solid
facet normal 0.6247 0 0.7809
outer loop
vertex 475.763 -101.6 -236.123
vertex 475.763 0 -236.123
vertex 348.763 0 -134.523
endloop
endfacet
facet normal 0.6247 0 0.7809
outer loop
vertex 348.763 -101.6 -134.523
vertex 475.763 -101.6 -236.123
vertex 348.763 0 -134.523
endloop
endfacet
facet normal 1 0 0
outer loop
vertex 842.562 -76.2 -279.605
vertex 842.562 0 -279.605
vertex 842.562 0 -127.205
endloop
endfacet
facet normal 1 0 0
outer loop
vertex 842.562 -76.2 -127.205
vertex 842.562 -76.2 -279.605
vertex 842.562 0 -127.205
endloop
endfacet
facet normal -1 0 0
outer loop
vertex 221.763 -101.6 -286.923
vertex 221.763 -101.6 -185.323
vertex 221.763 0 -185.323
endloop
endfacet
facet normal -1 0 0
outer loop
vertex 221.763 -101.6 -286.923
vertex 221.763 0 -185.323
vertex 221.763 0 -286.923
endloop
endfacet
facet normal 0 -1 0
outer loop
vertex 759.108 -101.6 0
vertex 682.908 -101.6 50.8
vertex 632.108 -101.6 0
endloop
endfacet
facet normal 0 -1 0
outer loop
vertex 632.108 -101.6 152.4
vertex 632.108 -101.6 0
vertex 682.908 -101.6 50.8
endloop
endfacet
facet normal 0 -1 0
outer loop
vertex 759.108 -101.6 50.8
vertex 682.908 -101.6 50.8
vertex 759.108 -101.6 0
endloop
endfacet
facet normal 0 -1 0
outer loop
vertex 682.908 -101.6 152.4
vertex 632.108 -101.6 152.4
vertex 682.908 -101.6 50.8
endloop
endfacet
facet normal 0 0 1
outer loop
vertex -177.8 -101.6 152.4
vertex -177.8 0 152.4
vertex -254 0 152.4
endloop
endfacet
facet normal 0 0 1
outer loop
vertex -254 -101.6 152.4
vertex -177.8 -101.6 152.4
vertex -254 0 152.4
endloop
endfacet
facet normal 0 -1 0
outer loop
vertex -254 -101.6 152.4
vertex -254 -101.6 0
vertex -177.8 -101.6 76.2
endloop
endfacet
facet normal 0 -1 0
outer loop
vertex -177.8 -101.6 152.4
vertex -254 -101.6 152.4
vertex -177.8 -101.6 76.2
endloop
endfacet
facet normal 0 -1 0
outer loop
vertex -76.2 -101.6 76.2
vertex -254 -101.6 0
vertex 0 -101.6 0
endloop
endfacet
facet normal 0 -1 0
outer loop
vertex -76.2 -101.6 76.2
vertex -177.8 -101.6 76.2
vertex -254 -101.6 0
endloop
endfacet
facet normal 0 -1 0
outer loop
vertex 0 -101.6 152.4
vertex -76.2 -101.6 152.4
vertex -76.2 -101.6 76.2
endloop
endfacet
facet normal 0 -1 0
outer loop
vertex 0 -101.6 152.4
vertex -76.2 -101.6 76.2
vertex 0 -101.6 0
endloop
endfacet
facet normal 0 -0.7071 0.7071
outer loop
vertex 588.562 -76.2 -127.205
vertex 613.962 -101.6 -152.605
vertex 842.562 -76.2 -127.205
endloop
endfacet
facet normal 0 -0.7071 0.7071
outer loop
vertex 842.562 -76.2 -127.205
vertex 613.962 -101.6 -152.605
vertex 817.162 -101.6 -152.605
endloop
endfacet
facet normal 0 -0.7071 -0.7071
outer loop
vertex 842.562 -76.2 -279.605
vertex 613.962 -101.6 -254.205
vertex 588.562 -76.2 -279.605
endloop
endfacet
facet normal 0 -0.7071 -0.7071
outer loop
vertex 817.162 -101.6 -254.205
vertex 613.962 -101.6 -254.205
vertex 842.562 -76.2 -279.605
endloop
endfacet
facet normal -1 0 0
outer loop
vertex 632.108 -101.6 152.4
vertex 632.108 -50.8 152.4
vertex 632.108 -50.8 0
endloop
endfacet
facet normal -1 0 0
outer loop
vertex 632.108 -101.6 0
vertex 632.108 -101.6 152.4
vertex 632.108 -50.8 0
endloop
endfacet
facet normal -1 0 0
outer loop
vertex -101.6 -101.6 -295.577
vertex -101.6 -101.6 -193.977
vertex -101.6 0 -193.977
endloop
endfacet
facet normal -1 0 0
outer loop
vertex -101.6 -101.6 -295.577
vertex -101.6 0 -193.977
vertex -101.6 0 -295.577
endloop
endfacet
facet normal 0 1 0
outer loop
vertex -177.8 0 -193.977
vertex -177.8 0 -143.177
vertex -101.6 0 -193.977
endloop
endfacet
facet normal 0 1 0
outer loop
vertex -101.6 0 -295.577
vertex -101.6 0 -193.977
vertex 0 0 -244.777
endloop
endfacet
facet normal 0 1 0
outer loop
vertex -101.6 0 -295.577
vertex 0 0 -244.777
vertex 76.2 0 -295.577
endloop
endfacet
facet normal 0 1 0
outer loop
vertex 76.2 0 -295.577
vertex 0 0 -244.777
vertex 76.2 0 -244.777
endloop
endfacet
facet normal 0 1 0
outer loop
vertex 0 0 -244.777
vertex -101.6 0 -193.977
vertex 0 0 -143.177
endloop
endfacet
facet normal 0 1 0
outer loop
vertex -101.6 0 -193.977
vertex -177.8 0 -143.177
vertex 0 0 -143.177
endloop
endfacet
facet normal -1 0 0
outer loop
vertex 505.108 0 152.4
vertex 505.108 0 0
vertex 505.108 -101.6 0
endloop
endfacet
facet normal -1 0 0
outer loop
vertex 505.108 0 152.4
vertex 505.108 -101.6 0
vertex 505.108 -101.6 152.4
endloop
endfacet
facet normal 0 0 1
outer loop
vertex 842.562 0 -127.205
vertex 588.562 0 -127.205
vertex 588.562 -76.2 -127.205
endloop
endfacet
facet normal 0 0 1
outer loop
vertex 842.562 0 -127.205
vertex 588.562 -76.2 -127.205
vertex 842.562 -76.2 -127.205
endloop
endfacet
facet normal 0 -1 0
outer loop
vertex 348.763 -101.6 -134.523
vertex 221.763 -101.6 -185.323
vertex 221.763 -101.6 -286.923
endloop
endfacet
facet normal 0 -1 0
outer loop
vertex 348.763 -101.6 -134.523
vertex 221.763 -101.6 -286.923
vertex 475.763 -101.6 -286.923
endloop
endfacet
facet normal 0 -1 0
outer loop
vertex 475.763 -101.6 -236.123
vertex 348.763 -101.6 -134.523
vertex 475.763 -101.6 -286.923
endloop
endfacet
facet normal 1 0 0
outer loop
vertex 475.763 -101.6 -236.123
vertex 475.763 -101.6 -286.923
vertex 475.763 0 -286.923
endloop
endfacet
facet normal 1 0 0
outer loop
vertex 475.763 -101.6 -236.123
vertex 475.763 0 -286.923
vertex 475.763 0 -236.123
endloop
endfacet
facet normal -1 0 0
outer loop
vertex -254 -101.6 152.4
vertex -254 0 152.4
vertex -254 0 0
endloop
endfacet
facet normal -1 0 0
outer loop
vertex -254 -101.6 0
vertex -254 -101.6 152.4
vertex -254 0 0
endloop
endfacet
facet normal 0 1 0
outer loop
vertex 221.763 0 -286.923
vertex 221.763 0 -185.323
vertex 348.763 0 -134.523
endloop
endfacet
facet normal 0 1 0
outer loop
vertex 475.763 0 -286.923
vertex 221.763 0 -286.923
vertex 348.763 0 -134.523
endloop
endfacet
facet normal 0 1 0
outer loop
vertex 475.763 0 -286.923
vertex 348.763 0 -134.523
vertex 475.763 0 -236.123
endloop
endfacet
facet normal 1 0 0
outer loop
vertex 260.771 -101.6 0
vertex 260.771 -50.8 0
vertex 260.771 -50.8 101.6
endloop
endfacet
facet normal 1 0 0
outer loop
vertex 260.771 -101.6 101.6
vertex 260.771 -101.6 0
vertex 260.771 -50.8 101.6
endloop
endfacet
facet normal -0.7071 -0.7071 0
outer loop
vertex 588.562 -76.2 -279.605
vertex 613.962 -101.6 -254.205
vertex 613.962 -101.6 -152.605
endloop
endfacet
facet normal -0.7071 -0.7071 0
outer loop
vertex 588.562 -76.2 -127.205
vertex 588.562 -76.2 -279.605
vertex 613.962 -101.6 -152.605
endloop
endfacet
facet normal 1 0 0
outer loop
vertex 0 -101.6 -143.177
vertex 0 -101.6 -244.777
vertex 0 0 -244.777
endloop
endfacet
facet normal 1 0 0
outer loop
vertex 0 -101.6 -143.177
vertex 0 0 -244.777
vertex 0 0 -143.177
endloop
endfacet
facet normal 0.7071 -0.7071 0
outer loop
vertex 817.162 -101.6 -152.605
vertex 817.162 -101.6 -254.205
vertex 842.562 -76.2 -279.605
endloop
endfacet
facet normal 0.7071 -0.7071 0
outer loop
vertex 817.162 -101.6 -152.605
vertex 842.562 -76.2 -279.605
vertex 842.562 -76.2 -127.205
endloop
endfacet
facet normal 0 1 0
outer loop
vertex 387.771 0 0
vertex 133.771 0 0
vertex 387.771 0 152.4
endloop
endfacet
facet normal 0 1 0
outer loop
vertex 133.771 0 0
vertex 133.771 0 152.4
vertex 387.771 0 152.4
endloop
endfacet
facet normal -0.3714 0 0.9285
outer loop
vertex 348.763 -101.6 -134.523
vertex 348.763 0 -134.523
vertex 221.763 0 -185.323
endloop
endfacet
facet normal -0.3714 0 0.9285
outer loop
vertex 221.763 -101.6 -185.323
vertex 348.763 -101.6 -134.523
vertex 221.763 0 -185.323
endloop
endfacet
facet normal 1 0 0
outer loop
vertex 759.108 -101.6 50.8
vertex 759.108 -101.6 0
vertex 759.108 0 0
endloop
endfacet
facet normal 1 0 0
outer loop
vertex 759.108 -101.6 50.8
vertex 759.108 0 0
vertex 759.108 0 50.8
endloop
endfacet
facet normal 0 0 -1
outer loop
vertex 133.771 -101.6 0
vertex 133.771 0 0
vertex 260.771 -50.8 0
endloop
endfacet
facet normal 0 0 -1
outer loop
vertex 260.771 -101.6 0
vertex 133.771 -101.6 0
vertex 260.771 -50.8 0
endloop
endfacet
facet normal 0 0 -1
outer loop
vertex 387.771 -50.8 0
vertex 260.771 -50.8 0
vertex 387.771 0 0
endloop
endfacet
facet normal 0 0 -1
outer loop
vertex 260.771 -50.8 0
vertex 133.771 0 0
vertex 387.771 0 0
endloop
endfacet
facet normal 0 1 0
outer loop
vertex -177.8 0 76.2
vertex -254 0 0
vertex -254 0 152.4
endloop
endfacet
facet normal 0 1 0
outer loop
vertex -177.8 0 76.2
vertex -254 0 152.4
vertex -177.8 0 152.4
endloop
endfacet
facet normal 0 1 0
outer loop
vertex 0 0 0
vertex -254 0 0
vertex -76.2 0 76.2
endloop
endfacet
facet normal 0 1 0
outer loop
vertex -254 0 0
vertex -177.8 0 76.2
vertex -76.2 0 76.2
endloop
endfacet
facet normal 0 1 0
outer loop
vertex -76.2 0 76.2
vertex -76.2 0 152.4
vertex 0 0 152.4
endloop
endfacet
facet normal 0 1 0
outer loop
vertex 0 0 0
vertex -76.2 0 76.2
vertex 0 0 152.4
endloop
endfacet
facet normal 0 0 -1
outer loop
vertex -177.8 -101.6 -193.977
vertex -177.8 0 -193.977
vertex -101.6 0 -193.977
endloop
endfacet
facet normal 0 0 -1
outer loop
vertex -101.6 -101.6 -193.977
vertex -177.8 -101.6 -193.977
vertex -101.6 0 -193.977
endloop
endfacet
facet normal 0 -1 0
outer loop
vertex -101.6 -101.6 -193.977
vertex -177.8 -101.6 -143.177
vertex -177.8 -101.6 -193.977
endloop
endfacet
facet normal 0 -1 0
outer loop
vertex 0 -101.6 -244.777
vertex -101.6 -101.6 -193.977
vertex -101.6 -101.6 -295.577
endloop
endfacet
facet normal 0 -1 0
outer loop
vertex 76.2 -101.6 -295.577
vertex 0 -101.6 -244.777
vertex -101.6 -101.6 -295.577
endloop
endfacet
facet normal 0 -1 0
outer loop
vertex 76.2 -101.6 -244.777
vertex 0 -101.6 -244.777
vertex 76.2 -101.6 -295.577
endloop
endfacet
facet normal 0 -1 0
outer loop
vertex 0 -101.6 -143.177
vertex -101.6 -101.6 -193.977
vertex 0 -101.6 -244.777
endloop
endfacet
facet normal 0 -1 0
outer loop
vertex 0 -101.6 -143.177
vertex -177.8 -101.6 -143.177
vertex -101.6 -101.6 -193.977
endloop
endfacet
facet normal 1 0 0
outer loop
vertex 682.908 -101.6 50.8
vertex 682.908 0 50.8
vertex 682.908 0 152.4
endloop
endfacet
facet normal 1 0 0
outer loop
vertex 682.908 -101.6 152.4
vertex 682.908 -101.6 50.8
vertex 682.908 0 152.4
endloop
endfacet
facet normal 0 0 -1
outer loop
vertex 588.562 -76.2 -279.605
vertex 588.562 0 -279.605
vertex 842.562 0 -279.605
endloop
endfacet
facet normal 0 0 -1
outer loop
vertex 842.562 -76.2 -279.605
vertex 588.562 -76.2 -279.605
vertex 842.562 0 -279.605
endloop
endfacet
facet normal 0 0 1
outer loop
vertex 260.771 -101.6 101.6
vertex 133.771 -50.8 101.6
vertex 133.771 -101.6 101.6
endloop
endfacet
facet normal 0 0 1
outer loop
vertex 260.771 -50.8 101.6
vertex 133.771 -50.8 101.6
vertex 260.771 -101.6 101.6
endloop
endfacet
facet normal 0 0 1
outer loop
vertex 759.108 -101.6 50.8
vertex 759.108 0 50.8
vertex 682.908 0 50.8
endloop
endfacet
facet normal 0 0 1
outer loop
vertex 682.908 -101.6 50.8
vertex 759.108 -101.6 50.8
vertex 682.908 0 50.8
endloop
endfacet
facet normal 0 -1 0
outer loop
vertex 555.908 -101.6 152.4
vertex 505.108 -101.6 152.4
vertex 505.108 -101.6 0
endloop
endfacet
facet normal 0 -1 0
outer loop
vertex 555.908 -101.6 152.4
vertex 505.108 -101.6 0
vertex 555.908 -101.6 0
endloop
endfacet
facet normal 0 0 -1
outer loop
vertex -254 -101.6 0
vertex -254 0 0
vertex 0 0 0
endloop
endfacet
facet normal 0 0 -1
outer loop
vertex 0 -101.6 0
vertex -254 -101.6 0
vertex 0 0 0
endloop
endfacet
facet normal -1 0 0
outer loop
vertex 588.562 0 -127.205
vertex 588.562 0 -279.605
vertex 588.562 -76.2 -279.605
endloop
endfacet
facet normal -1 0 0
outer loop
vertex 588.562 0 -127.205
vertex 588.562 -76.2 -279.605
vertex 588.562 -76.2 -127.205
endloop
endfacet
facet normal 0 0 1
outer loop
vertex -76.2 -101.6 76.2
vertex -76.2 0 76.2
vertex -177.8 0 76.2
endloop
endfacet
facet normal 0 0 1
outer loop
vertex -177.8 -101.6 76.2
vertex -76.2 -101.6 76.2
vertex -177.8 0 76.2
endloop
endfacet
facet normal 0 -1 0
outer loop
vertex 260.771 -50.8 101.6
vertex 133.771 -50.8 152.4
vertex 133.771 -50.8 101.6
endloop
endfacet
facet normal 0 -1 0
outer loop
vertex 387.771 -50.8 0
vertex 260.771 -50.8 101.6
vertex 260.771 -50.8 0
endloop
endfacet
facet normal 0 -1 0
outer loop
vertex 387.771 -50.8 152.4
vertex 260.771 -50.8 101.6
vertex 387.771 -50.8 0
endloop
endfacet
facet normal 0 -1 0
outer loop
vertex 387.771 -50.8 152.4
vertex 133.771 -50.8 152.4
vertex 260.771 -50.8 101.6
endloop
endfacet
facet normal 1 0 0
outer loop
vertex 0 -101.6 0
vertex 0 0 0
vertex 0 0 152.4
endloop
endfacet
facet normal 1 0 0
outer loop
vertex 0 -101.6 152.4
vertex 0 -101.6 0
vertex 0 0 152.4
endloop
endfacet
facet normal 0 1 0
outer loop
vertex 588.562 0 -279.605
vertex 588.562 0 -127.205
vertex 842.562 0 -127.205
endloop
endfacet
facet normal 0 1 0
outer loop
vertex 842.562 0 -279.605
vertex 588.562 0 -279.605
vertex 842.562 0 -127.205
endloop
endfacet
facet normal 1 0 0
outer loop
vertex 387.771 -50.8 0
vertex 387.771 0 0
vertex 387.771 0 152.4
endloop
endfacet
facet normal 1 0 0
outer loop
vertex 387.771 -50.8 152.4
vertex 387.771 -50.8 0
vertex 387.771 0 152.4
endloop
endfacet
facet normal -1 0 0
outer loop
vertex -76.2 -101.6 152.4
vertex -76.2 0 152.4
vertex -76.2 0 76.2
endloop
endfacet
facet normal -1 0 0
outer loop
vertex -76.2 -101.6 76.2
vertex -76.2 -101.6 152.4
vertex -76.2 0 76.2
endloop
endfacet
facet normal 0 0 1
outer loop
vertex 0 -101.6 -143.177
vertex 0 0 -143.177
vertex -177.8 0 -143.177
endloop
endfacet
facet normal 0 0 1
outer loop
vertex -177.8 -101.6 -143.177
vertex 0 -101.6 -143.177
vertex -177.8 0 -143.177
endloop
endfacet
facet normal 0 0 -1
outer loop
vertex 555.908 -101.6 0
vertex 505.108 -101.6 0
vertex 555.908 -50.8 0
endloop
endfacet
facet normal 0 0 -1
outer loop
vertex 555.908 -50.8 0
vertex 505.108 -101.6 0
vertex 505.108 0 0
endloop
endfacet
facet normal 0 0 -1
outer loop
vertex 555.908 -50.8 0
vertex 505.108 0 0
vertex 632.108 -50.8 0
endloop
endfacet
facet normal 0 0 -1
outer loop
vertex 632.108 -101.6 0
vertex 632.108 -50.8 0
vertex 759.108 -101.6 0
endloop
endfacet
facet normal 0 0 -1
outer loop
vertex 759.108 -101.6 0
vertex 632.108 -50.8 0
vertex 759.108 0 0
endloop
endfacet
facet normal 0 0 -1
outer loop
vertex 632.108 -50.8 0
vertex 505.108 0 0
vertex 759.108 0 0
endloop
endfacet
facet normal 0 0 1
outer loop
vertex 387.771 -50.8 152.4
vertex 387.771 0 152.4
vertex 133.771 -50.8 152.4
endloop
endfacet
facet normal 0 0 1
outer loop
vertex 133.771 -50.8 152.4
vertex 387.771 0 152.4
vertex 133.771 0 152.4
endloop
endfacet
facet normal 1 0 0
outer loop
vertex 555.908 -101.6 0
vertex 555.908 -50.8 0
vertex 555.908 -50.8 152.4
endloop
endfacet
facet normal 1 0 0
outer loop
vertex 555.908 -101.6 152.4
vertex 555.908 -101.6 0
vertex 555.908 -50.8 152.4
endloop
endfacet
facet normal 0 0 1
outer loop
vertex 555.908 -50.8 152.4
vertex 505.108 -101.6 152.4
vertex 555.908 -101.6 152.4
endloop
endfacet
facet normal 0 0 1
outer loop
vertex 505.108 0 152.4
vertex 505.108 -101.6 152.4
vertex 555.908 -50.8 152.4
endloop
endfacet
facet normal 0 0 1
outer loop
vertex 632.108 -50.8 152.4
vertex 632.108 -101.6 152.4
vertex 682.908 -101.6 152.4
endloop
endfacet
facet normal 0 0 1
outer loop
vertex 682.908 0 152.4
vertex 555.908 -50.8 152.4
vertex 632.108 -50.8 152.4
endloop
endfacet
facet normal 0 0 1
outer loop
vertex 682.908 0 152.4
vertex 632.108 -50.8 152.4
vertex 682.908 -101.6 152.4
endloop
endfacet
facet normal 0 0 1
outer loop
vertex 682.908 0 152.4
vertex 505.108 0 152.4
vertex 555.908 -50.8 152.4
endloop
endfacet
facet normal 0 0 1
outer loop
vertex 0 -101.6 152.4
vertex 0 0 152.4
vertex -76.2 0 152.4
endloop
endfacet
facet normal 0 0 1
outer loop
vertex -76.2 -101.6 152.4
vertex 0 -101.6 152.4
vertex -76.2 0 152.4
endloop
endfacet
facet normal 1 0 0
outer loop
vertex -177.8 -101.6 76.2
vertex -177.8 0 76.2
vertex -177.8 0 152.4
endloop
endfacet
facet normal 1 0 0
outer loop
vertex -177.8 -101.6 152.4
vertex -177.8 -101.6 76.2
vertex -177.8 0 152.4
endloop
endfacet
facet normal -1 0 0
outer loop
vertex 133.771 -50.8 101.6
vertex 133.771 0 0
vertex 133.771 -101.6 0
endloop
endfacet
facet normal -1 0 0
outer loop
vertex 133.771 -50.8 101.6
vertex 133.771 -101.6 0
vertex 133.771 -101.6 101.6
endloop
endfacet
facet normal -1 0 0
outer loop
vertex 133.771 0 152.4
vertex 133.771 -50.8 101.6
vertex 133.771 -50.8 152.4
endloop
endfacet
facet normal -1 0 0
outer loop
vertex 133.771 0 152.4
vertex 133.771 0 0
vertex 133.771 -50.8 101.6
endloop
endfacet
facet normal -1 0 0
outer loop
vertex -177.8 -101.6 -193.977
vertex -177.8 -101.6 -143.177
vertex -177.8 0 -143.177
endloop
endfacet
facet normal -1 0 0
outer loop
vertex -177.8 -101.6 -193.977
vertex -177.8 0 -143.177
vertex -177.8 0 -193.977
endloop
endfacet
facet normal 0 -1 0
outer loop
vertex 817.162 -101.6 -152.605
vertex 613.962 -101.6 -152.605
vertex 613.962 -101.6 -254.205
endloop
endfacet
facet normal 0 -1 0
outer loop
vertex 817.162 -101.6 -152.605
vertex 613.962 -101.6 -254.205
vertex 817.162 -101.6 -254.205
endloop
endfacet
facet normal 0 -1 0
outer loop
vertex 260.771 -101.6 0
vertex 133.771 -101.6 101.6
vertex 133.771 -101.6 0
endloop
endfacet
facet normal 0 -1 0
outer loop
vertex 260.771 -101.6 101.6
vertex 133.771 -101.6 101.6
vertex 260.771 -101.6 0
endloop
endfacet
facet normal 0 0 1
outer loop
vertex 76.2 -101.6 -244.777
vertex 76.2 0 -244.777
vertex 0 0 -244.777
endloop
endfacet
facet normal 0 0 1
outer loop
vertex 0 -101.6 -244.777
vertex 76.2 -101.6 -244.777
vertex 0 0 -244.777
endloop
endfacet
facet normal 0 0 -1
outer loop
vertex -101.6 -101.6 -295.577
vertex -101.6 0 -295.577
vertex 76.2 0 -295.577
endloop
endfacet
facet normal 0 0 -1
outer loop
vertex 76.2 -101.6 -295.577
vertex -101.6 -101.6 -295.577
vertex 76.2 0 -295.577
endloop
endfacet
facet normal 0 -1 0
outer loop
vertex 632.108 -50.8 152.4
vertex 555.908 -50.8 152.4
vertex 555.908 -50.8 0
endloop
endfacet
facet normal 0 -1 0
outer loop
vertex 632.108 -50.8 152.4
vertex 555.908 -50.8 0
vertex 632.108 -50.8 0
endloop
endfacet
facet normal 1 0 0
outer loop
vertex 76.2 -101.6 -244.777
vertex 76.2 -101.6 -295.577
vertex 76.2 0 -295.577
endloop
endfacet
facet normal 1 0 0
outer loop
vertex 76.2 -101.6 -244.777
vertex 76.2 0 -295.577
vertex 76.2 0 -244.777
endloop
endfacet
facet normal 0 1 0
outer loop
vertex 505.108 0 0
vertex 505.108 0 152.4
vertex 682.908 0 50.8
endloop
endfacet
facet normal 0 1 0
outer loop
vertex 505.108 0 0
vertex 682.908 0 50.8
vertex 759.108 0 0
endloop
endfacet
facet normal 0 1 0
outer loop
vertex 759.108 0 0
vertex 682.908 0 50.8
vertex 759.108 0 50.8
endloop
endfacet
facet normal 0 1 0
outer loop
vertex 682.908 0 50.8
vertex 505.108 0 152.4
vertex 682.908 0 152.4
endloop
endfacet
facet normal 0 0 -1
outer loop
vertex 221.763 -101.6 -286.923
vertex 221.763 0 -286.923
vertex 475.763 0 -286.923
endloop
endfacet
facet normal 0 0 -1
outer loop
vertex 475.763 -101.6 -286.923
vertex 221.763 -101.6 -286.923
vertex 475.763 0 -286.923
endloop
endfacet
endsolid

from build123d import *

# Parameters (mm, degrees)
F1_DEPTH  = 101.6
F3_DEPTH  = 101.6
F2_W      = 127
F2_H      = 101.6
F4_DEPTH  = 101.6
F5_DEPTH  = 50.8
F6_W      = 50.8
F6_H      = 152.4
F7_DEPTH  = 101.6
F6_W_2    = 76.2
F8_DEPTH  = 50.8
F9_DEPTH  = 101.6
F11_DEPTH = 101.6
F13_DEPTH = 101.6
F14_W     = 254
F14_H     = 152.4
F15_DEPTH = 101.6
F16_SIZE2 = 25.4
F16_SIZE  = 25.4


with BuildPart() as f1:
    # F0 (on Front) → F1 (new body)
    with BuildSketch(Plane.XZ):
        Polygon((-254, 0), (0, 0), (0, 152.4), (-76.2, 152.4), (-76.2, 76.2), (-177.8, 76.2), (-177.8, 152.4), (-254, 152.4), align=None)
    extrude(amount=F1_DEPTH)

    # F0 (on Front) → F3 (join)
    with BuildSketch(Plane.XZ):
        Polygon((-254, 0), (0, 0), (0, 152.4), (-76.2, 152.4), (-76.2, 76.2), (-177.8, 76.2), (-177.8, 152.4), (-254, 152.4), align=None)
    extrude(amount=F3_DEPTH)


with BuildPart() as f4:
    # F2 (on Front) → F4 (new body)
    with BuildSketch(Plane.XZ):
        with Locations((197.2706523503, 50.8)):
            Rectangle(F2_W, F2_H)
    extrude(amount=F4_DEPTH)

    # F2 (on Front) → F5 (join)
    with BuildSketch(Plane.XZ):
        with Locations((197.2706523503, 50.8)):
            Rectangle(F2_W, F2_H)
        Polygon((260.7706523503, 101.6), (260.7706523503, 0), (387.7706523503, 0), (387.7706523503, 152.4), (133.7706523503, 152.4), (133.7706523503, 101.6), align=None)
    extrude(amount=F5_DEPTH)


with BuildPart() as f7:
    # F6 (on Front) → F7 (new body)
    with BuildSketch(Plane.XZ):
        with Locations((530.5081609351, 76.2)):
            Rectangle(F6_W, F6_H)
    extrude(amount=F7_DEPTH)

    # F6 (on Front) → F8 (join)
    with BuildSketch(Plane.XZ):
        with Locations((530.5081609351, 76.2)):
            Rectangle(F6_W, F6_H)
        with Locations((594.0081609351, 76.2)):
            Rectangle(F6_W_2, F6_H)
        Polygon((632.1081609351, 152.4), (632.1081609351, 0), (759.1081609351, 0), (759.1081609351, 50.8), (682.9081609351, 50.8), (682.9081609351, 152.4), align=None)
    extrude(amount=F8_DEPTH)

    # F6 (on Front) → F9 (join)
    with BuildSketch(Plane.XZ):
        Polygon((632.1081609351, 152.4), (632.1081609351, 0), (759.1081609351, 0), (759.1081609351, 50.8), (682.9081609351, 50.8), (682.9081609351, 152.4), align=None)
    extrude(amount=F9_DEPTH)


with BuildPart() as f11:
    # F10 (on Front) → F11 (new body)
    with BuildSketch(Plane.XZ):
        Polygon((0, -244.7774564702), (0, -143.1774564702), (-177.8, -143.1774564702), (-177.8, -193.9774564702), (-101.6, -193.9774564702), (-101.6, -295.5774564702), (76.2, -295.5774564702), (76.2, -244.7774564702), align=None)
    extrude(amount=F11_DEPTH)


with BuildPart() as f13:
    # F12 (on Front) → F13 (new body)
    with BuildSketch(Plane.XZ):
        Polygon((348.7631558649, -134.522906208), (348.7631558649, -286.922906208), (475.7631558649, -286.922906208), (475.7631558649, -236.122906208), align=None)
        Polygon((221.7631558649, -185.322906208), (221.7631558649, -286.922906208), (348.7631558649, -286.922906208), (348.7631558649, -134.522906208), align=None)
    extrude(amount=F13_DEPTH)


with BuildPart() as f15:
    # F14 (on Front) → F15 (new body)
    with BuildSketch(Plane.XZ):
        with Locations((715.5619859695, -203.404637192)):
            Rectangle(F14_W, F14_H)
    extrude(amount=F15_DEPTH)

    # F16
    f16_edges = [f15.edges().sort_by_distance(p)[0] for p in [
        (588.561986, -101.6, -203.404637),
        (715.561986, -101.6, -279.604637),
        (842.561986, -101.6, -203.404637),
        (715.561986, -101.6, -127.204637),
    ]]
    chamfer(f16_edges, length=F16_SIZE, length2=F16_SIZE2)


solid = Compound([f1.part, f4.part, f7.part, f11.part, f13.part, f15.part])
